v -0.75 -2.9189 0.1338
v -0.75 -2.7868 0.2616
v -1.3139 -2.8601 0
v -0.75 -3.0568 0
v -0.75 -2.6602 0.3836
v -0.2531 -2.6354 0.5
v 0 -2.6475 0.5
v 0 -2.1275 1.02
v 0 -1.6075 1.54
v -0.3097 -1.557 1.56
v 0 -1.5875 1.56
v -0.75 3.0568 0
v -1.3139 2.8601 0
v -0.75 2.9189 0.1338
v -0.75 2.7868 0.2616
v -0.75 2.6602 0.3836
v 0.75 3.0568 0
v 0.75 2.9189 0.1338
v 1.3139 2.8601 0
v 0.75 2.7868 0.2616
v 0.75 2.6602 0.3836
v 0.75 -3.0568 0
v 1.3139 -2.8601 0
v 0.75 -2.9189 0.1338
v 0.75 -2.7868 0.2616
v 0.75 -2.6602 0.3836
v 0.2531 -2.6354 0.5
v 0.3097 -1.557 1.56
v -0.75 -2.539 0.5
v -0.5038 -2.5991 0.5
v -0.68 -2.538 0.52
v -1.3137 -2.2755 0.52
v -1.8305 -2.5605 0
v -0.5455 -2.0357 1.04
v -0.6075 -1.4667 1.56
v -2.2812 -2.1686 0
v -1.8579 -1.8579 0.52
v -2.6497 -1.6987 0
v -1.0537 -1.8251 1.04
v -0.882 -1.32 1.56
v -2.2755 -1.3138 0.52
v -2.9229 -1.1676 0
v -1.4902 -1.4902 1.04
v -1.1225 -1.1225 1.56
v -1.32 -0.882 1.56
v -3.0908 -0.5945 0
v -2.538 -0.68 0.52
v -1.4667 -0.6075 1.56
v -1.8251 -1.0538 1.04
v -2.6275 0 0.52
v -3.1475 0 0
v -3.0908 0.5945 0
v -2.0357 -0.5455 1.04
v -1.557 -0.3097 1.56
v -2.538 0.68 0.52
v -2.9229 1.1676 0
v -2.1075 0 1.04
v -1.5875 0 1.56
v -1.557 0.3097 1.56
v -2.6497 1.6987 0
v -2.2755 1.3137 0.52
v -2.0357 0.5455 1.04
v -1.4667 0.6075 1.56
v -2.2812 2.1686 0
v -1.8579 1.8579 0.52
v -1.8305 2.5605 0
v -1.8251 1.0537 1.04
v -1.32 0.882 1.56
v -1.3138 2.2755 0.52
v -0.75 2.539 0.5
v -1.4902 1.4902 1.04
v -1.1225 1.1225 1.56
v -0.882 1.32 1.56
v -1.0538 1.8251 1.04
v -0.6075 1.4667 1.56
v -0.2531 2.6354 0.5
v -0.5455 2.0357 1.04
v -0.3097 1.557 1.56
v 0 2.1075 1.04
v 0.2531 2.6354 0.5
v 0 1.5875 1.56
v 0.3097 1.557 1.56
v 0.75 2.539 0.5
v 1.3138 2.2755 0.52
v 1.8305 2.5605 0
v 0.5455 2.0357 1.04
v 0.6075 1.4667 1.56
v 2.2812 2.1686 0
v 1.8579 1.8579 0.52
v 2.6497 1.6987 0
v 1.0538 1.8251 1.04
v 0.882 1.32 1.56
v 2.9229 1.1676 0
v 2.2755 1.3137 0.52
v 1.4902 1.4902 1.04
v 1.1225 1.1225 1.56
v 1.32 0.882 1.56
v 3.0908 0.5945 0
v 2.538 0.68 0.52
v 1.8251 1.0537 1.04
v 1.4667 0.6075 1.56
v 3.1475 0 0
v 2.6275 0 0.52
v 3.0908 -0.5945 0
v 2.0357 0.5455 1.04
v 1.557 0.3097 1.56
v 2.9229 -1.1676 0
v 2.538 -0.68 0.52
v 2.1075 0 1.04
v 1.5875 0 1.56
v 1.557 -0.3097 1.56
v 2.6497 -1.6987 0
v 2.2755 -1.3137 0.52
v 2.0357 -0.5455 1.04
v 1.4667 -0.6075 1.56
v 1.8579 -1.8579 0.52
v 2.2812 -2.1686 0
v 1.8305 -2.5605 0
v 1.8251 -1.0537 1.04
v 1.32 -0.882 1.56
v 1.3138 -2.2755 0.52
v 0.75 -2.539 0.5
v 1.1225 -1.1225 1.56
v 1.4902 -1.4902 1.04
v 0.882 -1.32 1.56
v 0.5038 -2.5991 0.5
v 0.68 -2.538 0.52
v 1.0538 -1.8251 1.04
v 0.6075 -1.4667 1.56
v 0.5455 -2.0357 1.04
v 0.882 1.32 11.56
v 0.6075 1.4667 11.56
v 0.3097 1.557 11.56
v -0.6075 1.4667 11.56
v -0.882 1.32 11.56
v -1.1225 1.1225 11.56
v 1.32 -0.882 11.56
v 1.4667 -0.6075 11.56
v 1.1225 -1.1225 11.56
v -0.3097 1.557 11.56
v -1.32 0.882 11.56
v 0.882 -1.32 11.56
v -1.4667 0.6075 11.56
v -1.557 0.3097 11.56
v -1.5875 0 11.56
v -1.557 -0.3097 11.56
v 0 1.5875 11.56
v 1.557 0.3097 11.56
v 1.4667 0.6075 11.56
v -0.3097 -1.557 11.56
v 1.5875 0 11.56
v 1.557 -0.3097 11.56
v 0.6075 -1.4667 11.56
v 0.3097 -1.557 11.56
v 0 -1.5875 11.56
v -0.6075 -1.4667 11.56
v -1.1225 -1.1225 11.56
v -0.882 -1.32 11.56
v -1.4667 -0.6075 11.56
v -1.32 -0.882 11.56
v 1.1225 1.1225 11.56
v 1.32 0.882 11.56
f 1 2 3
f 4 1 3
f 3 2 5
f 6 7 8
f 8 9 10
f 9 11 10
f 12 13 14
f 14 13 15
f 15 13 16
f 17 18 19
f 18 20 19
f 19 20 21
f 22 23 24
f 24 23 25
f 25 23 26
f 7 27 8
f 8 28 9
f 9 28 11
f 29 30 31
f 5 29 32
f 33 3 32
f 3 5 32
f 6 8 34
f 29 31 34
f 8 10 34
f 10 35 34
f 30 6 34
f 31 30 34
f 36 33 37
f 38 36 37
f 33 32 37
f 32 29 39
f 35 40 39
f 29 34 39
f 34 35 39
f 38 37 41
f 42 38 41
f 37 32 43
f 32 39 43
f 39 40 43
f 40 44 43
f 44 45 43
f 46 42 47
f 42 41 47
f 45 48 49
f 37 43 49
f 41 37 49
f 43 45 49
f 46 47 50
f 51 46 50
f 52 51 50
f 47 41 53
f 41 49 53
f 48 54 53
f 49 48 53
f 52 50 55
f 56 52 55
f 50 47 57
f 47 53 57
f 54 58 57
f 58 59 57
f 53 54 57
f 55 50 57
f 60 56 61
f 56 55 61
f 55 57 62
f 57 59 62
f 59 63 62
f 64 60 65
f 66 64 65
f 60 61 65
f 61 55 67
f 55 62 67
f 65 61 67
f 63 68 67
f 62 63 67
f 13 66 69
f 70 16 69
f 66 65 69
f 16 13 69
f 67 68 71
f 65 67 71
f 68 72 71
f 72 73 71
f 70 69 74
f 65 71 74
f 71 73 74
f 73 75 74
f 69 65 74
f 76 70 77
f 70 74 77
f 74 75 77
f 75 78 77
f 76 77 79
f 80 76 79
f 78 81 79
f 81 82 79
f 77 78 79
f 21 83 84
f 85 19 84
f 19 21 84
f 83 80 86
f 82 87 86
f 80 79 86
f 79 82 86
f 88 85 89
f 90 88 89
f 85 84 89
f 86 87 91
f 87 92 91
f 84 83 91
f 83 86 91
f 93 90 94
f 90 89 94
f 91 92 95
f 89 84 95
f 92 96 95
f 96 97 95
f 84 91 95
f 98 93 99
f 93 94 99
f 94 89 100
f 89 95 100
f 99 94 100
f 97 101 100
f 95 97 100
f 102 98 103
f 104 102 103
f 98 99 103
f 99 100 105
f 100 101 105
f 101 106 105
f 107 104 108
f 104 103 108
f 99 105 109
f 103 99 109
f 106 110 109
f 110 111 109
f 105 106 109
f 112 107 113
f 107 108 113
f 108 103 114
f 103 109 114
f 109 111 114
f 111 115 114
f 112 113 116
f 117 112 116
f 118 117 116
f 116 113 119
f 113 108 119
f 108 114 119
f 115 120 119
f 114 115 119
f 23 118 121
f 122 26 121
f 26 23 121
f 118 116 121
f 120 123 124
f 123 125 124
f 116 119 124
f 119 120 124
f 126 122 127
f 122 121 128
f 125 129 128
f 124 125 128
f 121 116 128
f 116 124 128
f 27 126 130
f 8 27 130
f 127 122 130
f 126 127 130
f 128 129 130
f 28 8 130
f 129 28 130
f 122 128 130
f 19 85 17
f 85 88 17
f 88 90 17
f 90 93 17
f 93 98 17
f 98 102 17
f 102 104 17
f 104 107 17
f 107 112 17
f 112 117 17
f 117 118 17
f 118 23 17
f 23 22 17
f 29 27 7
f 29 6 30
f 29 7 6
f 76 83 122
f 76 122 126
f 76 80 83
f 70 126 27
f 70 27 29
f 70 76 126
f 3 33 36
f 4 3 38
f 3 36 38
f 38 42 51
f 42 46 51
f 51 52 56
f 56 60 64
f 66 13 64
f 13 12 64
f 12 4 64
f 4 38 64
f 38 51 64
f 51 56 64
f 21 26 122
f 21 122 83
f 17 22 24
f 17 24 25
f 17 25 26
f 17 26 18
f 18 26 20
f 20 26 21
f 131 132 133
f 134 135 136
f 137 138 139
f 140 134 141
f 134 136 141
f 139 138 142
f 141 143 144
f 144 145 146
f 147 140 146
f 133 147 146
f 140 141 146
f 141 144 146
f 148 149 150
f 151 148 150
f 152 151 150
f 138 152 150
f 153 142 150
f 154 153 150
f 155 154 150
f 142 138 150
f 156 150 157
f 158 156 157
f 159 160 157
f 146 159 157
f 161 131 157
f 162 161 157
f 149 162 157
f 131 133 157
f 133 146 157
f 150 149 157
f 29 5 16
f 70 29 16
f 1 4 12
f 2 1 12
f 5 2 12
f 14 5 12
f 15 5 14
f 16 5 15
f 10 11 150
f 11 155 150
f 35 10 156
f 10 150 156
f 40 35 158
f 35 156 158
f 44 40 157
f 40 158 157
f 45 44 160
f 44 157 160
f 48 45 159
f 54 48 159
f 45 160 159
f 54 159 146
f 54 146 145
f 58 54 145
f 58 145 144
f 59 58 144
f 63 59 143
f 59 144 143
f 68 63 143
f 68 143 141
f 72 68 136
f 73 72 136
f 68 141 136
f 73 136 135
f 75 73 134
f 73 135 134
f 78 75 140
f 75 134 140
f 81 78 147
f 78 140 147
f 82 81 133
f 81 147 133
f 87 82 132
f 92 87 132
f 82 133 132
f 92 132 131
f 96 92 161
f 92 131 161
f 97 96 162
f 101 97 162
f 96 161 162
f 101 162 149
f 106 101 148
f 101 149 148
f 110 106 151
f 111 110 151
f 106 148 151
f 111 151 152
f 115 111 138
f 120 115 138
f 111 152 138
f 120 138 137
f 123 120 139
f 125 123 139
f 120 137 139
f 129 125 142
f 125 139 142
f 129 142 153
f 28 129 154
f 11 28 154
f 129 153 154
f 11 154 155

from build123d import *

# Parameters (mm, degrees)
ESBO_O2_W             = 1.5
ESBO_O2_H             = 7
CORTE_EXTRUS_O1_DEPTH = 0.5


with BuildPart() as part:
    # Esboço1 → Revolução1 (revolve)
    with BuildSketch(Plane(origin=(0, 0, 0), x_dir=(0, 0, -1), z_dir=(1, 0, 0)), mode=Mode.PRIVATE) as revolu_o1_sk:
        Polygon((0, 0), (0, 3.1475), (-1.56, 1.5875), (-11.56, 1.5875), (-11.56, 0), align=None)
    revolve(revolu_o1_sk.sketch.rotate(Axis((0, 0, 11.56), (0, 0, -1)), 180), axis=Axis((0, 0, 11.56), (0, 0, -1)))

    # Esboço2 → Corte-extrusão1 (cut)
    with BuildSketch(Plane(origin=(0, 0, 0), x_dir=(-1, 0, 0), z_dir=(0, 0, -1))):
        Rectangle(ESBO_O2_W, ESBO_O2_H)
    extrude(amount=-CORTE_EXTRUS_O1_DEPTH, mode=Mode.SUBTRACT)


solid = part.part
